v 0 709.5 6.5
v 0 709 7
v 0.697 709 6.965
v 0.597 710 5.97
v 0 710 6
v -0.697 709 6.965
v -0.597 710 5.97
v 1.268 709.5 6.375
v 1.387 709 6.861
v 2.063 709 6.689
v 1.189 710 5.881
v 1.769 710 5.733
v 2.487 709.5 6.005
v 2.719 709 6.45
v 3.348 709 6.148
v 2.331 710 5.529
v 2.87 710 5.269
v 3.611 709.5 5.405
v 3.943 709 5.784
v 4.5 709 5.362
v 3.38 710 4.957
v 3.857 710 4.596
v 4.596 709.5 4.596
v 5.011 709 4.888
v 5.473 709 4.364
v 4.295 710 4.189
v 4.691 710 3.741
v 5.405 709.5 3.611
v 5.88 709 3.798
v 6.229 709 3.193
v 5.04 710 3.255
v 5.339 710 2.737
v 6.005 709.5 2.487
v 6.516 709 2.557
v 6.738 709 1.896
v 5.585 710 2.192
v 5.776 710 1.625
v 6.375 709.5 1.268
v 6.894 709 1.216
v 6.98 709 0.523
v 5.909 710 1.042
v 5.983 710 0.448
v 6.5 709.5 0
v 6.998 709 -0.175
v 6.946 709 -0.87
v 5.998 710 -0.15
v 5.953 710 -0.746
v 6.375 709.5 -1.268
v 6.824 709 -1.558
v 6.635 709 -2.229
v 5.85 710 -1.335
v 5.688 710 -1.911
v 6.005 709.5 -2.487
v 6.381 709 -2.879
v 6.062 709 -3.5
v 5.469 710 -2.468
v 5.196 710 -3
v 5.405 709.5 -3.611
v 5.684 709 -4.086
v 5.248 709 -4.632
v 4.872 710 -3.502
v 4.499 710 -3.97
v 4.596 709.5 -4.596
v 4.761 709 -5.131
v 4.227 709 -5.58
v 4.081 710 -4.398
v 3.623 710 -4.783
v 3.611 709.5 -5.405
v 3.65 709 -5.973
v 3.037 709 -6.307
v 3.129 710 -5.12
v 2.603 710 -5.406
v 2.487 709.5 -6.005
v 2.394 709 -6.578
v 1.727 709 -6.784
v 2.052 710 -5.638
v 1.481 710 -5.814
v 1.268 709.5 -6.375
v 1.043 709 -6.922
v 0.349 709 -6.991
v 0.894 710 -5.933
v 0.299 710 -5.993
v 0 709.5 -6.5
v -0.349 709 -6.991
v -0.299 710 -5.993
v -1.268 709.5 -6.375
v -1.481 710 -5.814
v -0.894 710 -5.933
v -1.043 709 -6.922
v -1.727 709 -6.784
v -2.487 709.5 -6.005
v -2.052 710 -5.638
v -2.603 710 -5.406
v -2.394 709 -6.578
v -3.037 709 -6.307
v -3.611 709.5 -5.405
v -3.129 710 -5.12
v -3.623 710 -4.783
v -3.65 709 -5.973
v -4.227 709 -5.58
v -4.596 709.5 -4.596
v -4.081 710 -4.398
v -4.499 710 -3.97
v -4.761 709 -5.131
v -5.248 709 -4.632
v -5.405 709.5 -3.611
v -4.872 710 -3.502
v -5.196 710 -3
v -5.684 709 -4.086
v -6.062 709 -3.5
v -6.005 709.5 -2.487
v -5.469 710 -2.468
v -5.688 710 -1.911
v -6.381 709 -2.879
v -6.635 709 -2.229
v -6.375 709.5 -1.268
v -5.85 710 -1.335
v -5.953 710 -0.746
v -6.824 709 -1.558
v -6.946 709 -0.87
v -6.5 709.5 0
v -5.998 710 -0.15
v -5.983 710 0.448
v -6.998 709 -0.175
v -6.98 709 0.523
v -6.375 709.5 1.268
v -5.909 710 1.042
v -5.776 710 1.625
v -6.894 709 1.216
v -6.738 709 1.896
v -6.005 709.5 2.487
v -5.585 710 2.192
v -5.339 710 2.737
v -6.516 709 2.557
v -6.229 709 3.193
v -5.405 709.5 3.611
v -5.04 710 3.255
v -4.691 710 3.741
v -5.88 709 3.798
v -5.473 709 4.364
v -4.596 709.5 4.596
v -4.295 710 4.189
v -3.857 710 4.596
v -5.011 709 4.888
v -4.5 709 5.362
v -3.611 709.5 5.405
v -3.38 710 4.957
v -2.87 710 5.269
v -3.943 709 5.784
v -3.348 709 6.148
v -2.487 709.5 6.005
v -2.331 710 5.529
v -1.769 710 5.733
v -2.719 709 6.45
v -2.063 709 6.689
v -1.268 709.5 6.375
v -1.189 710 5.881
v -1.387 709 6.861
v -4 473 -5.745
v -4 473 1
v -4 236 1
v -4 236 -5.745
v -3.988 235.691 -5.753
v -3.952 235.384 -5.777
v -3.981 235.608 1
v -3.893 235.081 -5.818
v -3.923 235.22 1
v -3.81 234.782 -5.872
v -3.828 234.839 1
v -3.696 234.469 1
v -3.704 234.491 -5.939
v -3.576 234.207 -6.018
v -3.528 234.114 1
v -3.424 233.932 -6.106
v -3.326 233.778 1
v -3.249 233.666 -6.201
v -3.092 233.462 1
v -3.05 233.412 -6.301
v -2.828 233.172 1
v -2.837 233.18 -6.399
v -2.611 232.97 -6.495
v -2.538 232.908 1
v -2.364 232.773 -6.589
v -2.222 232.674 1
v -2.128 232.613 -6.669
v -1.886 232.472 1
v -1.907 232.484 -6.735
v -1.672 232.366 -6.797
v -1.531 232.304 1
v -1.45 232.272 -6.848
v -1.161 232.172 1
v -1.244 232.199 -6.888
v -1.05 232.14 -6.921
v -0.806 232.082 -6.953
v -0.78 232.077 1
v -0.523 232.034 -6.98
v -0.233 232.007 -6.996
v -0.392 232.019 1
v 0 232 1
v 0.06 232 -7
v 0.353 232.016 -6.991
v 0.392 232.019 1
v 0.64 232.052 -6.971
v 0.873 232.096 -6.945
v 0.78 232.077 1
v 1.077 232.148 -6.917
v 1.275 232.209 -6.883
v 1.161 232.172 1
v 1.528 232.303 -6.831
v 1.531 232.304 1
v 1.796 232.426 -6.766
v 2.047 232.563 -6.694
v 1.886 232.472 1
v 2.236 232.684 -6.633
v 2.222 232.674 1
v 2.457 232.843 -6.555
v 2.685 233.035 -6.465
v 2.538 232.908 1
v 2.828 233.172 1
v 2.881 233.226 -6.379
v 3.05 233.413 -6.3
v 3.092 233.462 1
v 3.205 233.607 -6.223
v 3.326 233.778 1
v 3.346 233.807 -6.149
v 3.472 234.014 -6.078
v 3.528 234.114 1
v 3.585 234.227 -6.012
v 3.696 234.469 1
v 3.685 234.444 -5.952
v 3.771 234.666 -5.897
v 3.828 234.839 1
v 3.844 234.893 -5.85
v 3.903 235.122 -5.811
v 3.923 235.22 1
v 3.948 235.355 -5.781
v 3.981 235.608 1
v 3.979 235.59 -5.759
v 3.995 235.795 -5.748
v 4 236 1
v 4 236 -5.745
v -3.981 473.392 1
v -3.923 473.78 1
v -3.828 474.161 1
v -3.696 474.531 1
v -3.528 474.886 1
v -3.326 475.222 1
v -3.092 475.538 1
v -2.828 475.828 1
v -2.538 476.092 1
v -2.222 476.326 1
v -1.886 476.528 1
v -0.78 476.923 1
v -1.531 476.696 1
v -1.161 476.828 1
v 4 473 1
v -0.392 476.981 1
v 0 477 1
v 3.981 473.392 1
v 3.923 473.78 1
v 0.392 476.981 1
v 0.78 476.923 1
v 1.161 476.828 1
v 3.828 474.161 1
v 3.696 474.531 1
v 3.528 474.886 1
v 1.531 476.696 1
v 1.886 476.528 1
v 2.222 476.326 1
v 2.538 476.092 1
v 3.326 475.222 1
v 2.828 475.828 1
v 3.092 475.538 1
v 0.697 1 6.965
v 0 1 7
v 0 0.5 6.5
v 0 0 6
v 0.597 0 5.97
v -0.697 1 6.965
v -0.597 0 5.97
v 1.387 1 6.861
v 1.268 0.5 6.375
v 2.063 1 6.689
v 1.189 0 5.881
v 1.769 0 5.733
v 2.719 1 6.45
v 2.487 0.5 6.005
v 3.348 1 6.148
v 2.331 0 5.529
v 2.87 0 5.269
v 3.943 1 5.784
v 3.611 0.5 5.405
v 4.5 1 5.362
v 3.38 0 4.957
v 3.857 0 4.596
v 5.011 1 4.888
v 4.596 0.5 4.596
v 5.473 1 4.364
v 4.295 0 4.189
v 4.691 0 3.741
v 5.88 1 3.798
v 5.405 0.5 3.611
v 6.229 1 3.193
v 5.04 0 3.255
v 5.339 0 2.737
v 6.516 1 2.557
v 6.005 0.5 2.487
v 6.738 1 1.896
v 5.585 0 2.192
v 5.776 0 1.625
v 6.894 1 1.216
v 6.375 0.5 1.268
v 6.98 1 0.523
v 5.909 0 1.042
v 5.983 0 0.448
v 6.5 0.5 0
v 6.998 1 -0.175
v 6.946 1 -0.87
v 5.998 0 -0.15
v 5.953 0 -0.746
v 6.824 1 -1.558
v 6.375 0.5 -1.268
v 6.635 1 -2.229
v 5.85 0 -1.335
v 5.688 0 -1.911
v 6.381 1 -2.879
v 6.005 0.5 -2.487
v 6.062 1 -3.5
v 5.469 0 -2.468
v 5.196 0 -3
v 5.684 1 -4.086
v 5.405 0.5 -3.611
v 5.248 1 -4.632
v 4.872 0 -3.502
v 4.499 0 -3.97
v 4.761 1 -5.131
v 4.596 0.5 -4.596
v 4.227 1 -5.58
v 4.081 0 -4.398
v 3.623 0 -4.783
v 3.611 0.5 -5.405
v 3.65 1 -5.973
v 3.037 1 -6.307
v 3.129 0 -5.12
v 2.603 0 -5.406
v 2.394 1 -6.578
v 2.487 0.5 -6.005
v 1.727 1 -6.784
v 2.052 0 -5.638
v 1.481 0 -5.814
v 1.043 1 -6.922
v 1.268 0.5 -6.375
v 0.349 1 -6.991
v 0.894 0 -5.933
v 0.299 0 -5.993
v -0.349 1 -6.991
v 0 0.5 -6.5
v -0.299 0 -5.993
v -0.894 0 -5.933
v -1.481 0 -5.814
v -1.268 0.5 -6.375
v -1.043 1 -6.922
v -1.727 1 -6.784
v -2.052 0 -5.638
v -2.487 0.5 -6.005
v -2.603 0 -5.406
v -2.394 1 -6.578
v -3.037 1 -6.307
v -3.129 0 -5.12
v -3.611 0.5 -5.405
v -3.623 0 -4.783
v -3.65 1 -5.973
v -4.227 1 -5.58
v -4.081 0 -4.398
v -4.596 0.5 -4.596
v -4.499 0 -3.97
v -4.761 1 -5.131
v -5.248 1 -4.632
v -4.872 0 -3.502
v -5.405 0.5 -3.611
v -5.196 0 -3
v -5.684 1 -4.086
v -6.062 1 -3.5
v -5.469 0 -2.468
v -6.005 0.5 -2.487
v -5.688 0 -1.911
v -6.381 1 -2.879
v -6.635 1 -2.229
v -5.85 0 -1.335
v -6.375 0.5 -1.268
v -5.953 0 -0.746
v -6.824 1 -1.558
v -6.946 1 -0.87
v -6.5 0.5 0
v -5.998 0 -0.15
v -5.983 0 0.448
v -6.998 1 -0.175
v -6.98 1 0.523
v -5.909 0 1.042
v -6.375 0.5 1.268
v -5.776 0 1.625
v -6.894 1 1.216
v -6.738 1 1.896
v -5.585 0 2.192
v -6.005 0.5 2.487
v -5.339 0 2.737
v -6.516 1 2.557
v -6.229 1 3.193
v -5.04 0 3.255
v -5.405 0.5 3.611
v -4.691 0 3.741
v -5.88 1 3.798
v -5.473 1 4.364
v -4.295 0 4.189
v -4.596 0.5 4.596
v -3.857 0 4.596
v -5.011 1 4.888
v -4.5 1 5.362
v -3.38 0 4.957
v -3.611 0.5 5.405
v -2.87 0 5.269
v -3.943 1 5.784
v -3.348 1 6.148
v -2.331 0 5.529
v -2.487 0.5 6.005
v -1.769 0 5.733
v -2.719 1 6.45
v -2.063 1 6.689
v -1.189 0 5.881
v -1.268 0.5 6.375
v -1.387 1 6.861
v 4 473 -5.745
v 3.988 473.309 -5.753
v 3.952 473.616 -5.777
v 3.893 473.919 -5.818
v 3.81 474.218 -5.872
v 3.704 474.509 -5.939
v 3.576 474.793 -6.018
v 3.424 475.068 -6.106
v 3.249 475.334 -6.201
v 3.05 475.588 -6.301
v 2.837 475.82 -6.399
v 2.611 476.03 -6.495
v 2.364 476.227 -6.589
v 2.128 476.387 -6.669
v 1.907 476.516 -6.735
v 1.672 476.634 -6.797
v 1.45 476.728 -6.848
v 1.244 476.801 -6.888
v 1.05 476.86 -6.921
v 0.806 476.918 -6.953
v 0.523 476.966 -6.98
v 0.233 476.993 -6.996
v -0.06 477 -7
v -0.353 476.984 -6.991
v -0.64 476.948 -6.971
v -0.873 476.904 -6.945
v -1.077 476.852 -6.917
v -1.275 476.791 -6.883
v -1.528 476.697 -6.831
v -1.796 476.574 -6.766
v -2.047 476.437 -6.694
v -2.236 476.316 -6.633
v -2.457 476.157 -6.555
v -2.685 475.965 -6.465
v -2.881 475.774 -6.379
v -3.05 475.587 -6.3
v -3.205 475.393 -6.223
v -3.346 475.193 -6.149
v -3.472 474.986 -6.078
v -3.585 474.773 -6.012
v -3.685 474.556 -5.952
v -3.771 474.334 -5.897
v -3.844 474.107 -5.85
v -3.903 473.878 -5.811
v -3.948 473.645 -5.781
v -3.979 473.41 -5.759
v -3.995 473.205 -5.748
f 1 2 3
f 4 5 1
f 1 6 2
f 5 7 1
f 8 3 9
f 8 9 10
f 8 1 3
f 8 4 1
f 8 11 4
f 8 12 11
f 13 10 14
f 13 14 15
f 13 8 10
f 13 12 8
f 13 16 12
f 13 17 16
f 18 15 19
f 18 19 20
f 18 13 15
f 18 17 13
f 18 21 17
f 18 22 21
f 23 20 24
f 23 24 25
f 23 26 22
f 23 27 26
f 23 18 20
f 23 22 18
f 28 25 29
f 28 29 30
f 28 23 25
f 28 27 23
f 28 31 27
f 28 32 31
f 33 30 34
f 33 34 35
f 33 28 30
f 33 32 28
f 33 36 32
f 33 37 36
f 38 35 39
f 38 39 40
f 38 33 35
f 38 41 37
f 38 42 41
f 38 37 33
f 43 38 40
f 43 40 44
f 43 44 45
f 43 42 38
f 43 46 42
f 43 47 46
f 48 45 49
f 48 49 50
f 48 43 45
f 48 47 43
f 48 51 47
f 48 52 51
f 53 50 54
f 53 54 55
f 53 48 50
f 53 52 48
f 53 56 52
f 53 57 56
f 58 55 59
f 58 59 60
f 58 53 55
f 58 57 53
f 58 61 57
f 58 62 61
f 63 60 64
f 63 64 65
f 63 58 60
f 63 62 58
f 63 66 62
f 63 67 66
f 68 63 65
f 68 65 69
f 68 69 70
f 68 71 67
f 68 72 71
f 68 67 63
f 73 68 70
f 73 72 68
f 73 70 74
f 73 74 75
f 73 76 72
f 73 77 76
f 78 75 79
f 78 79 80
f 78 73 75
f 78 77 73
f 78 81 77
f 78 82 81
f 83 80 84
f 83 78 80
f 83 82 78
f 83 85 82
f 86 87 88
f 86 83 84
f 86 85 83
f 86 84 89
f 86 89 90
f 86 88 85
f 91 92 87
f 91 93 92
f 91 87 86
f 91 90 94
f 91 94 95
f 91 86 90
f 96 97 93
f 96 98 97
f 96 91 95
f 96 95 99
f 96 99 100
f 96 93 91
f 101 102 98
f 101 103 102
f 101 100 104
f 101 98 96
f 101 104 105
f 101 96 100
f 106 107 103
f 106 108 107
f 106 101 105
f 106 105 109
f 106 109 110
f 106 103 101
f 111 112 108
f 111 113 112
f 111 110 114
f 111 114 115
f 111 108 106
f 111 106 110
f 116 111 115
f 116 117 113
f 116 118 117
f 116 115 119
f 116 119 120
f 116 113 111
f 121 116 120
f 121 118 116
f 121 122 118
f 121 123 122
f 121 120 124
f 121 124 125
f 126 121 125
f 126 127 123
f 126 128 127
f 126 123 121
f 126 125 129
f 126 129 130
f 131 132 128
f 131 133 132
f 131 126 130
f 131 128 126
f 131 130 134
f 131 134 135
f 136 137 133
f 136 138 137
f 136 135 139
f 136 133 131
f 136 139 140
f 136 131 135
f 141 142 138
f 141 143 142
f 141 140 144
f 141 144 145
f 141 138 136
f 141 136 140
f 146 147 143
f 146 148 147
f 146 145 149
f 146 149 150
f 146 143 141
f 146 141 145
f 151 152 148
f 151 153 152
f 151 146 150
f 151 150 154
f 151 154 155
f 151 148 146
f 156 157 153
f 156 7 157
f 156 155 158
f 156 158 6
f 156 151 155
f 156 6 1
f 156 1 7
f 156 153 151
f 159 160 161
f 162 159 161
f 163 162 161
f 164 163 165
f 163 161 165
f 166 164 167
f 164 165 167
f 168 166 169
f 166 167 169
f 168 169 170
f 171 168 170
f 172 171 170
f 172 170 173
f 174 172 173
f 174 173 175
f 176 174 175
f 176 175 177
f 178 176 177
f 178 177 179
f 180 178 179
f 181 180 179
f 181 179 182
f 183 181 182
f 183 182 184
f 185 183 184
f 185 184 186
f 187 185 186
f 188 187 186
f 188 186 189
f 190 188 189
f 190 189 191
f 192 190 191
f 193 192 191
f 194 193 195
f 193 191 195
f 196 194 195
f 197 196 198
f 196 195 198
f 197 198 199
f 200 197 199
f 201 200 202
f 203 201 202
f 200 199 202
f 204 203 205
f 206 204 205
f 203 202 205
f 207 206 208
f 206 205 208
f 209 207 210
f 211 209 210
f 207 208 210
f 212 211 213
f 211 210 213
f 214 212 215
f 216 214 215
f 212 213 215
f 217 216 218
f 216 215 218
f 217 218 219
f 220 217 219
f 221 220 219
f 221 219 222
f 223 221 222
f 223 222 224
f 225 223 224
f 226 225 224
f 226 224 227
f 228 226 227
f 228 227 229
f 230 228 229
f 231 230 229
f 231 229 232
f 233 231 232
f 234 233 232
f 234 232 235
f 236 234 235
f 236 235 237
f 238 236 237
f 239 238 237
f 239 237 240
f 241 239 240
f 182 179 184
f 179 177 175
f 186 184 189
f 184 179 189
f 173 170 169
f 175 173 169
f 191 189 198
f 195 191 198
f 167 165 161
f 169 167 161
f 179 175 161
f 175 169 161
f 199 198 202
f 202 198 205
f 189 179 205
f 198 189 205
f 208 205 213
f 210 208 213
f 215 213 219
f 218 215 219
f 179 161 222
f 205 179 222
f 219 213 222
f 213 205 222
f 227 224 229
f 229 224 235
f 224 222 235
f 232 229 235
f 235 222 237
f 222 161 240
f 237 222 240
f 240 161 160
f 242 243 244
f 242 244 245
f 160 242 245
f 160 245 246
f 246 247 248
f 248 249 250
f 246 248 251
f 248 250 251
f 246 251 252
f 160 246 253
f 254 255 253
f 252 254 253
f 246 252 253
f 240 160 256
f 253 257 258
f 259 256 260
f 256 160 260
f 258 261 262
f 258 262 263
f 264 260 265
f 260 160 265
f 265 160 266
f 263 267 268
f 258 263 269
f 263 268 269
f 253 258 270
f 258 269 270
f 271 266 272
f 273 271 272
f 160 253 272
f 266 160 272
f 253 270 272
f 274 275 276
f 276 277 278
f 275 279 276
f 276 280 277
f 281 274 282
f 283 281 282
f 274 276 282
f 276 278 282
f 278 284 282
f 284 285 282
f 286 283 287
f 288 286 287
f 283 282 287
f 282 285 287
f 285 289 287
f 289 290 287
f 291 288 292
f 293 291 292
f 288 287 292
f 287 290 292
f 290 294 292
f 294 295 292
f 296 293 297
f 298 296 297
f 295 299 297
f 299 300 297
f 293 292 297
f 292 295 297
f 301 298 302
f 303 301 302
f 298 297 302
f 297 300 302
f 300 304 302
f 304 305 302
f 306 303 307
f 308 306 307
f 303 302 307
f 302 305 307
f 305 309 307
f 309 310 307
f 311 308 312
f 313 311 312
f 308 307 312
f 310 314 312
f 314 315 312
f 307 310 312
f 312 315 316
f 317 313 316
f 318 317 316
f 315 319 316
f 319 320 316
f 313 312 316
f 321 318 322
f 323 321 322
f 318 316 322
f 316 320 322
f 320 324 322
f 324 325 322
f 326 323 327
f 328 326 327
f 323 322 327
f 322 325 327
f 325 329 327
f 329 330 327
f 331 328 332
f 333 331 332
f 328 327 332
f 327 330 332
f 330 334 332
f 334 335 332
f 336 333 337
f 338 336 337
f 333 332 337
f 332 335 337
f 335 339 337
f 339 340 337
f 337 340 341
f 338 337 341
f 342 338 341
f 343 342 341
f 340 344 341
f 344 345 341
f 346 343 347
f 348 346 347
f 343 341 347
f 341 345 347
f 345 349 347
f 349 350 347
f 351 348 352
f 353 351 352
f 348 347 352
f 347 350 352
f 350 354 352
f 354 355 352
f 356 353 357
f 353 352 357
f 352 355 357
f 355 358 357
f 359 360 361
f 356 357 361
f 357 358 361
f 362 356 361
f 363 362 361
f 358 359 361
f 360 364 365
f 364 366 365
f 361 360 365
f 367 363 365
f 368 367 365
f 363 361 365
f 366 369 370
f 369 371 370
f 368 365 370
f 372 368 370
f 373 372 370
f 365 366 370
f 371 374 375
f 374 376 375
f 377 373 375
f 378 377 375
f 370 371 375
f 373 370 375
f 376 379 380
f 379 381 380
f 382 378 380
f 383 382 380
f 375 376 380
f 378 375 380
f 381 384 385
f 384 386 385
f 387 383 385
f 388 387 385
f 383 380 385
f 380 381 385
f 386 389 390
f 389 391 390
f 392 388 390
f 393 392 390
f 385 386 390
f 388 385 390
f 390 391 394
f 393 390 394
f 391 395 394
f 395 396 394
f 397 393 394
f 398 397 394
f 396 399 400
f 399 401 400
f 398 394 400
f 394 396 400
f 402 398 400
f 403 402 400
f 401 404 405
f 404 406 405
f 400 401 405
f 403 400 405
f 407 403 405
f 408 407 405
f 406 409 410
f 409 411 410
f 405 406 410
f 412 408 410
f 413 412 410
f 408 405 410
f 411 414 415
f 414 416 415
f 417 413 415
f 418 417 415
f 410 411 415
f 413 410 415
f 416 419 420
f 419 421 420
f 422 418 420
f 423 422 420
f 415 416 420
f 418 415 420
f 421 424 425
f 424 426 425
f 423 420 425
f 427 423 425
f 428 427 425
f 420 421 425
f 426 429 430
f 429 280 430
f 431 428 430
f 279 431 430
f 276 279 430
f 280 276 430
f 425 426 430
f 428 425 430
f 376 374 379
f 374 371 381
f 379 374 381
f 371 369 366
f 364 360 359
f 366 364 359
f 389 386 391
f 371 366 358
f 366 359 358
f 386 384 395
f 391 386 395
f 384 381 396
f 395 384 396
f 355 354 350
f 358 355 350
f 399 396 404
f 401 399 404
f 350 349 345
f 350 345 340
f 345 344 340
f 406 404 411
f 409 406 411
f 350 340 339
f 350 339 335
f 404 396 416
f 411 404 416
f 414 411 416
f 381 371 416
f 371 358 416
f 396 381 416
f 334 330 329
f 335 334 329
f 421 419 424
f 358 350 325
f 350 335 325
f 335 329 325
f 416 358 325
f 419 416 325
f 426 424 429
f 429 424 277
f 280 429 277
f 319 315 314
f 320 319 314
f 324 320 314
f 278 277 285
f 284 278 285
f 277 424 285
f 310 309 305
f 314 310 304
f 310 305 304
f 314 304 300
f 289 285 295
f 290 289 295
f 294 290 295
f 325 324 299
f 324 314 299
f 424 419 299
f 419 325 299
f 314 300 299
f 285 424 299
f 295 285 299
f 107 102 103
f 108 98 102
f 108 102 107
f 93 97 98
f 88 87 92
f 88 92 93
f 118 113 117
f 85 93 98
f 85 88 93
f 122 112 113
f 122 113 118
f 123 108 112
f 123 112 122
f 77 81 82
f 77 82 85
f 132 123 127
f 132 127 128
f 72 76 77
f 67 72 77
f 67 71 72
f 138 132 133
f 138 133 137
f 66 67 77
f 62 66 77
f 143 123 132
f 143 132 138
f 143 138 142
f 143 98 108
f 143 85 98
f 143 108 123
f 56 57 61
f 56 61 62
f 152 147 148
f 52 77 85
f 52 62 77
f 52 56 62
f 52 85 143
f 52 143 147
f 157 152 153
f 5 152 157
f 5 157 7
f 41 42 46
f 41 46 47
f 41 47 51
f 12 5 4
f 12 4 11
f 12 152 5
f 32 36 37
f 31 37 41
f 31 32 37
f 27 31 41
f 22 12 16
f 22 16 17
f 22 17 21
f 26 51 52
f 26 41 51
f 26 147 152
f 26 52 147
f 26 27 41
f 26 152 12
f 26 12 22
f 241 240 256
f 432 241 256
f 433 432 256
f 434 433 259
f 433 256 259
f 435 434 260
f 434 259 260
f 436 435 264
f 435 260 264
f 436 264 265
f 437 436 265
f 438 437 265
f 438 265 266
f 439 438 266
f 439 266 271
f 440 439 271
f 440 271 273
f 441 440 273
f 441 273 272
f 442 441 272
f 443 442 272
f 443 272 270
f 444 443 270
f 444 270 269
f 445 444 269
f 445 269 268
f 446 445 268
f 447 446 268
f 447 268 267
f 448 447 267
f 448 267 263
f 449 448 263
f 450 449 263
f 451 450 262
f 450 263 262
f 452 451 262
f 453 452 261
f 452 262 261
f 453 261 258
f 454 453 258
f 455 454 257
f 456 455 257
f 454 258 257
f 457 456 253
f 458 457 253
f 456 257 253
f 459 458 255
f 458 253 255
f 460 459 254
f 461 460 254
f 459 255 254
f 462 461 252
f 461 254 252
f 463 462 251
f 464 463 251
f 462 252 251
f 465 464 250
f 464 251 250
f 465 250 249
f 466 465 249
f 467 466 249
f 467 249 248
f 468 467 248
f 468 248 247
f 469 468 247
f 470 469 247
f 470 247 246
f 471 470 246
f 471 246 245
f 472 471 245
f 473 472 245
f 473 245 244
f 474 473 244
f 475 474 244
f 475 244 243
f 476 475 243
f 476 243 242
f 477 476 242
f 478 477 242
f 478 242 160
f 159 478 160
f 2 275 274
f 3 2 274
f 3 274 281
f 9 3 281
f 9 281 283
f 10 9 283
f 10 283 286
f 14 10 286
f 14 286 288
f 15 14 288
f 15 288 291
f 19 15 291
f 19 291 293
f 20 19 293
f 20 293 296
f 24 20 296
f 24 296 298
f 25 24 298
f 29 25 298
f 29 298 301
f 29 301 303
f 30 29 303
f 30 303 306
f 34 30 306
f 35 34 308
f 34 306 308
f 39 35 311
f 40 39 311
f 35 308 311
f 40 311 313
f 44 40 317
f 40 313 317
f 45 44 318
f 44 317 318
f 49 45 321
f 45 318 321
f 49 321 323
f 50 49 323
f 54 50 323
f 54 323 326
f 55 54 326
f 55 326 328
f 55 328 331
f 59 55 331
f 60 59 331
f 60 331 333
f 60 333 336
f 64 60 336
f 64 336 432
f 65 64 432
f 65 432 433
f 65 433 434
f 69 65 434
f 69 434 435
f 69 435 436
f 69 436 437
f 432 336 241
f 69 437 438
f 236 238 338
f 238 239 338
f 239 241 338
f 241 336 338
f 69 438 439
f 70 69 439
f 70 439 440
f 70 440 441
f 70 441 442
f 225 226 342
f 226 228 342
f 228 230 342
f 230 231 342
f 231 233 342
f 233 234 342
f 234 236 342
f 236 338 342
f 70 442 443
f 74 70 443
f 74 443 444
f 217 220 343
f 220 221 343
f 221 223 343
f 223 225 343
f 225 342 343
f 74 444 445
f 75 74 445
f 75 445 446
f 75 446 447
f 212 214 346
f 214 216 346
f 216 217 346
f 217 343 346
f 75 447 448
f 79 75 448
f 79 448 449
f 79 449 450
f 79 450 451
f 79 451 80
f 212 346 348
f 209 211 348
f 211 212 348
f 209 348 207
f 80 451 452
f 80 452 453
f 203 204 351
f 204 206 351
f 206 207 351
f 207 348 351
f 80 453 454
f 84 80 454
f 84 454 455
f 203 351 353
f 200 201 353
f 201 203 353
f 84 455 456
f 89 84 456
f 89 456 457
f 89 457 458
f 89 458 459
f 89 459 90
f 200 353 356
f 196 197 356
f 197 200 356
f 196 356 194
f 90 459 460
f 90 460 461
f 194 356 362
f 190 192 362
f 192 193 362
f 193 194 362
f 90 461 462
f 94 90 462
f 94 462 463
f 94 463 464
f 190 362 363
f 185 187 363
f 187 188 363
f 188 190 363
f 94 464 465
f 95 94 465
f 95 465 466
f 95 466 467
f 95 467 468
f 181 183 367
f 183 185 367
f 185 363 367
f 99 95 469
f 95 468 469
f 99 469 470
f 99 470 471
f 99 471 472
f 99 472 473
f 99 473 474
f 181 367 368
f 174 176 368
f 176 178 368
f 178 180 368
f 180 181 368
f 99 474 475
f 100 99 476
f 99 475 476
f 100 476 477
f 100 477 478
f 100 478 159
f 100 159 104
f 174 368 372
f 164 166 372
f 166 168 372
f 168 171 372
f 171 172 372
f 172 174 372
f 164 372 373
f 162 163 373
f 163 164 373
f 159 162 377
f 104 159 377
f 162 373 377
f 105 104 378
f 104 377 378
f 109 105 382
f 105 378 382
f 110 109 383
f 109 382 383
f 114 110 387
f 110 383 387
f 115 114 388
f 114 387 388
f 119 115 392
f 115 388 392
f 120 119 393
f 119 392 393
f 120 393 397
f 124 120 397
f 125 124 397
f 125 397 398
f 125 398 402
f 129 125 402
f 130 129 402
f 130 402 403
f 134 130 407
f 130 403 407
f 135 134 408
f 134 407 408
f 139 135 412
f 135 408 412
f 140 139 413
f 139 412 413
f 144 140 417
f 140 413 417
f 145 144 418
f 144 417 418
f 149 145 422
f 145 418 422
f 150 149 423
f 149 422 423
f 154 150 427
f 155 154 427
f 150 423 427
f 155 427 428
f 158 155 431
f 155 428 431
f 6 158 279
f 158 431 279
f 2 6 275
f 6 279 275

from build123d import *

# Parameters (mm, degrees)
ESQUISSE1_R             = 7
BOSS_EXTRU_1_DEPTH      = 710
CHANFREIN1_SIZE         = 1
ENL_V_START             = 1
ENL_V_MAT_EXTRU_1_DEPTH = 10


with BuildPart() as part:
    # Esquisse1 → Boss.-Extru.1 (new body)
    with BuildSketch(Plane(origin=(0, 0, 0), x_dir=(1, 0, 0), z_dir=(0, 1, 0))):
        with Locations(Location((0, 0, 0), (0, 0, 270))):  # turned: the seam where the file's is
            Circle(ESQUISSE1_R)
    extrude(amount=BOSS_EXTRU_1_DEPTH)

    # Chanfrein1
    chanfrein1_edges = [part.edges().sort_by_distance(p)[0] for p in [
        (0, 0, -7),
        (0, 710, -7),
    ]]
    chamfer(chanfrein1_edges, length=CHANFREIN1_SIZE)

    # Esquisse2 → Enlèv. mat.-Extru.1 (cut)
    with BuildSketch(Plane.XY.offset(ENL_V_START)):
        with BuildLine():
            Line((-4, 473), (-4, 236))
            ThreePointArc((-4, 236), (0, 232), (4, 236))
            Line((4, 236), (4, 473))
            ThreePointArc((4, 473), (0, 477), (-4, 473))
        make_face()
    extrude(amount=-ENL_V_MAT_EXTRU_1_DEPTH, mode=Mode.SUBTRACT)


solid = part.part
